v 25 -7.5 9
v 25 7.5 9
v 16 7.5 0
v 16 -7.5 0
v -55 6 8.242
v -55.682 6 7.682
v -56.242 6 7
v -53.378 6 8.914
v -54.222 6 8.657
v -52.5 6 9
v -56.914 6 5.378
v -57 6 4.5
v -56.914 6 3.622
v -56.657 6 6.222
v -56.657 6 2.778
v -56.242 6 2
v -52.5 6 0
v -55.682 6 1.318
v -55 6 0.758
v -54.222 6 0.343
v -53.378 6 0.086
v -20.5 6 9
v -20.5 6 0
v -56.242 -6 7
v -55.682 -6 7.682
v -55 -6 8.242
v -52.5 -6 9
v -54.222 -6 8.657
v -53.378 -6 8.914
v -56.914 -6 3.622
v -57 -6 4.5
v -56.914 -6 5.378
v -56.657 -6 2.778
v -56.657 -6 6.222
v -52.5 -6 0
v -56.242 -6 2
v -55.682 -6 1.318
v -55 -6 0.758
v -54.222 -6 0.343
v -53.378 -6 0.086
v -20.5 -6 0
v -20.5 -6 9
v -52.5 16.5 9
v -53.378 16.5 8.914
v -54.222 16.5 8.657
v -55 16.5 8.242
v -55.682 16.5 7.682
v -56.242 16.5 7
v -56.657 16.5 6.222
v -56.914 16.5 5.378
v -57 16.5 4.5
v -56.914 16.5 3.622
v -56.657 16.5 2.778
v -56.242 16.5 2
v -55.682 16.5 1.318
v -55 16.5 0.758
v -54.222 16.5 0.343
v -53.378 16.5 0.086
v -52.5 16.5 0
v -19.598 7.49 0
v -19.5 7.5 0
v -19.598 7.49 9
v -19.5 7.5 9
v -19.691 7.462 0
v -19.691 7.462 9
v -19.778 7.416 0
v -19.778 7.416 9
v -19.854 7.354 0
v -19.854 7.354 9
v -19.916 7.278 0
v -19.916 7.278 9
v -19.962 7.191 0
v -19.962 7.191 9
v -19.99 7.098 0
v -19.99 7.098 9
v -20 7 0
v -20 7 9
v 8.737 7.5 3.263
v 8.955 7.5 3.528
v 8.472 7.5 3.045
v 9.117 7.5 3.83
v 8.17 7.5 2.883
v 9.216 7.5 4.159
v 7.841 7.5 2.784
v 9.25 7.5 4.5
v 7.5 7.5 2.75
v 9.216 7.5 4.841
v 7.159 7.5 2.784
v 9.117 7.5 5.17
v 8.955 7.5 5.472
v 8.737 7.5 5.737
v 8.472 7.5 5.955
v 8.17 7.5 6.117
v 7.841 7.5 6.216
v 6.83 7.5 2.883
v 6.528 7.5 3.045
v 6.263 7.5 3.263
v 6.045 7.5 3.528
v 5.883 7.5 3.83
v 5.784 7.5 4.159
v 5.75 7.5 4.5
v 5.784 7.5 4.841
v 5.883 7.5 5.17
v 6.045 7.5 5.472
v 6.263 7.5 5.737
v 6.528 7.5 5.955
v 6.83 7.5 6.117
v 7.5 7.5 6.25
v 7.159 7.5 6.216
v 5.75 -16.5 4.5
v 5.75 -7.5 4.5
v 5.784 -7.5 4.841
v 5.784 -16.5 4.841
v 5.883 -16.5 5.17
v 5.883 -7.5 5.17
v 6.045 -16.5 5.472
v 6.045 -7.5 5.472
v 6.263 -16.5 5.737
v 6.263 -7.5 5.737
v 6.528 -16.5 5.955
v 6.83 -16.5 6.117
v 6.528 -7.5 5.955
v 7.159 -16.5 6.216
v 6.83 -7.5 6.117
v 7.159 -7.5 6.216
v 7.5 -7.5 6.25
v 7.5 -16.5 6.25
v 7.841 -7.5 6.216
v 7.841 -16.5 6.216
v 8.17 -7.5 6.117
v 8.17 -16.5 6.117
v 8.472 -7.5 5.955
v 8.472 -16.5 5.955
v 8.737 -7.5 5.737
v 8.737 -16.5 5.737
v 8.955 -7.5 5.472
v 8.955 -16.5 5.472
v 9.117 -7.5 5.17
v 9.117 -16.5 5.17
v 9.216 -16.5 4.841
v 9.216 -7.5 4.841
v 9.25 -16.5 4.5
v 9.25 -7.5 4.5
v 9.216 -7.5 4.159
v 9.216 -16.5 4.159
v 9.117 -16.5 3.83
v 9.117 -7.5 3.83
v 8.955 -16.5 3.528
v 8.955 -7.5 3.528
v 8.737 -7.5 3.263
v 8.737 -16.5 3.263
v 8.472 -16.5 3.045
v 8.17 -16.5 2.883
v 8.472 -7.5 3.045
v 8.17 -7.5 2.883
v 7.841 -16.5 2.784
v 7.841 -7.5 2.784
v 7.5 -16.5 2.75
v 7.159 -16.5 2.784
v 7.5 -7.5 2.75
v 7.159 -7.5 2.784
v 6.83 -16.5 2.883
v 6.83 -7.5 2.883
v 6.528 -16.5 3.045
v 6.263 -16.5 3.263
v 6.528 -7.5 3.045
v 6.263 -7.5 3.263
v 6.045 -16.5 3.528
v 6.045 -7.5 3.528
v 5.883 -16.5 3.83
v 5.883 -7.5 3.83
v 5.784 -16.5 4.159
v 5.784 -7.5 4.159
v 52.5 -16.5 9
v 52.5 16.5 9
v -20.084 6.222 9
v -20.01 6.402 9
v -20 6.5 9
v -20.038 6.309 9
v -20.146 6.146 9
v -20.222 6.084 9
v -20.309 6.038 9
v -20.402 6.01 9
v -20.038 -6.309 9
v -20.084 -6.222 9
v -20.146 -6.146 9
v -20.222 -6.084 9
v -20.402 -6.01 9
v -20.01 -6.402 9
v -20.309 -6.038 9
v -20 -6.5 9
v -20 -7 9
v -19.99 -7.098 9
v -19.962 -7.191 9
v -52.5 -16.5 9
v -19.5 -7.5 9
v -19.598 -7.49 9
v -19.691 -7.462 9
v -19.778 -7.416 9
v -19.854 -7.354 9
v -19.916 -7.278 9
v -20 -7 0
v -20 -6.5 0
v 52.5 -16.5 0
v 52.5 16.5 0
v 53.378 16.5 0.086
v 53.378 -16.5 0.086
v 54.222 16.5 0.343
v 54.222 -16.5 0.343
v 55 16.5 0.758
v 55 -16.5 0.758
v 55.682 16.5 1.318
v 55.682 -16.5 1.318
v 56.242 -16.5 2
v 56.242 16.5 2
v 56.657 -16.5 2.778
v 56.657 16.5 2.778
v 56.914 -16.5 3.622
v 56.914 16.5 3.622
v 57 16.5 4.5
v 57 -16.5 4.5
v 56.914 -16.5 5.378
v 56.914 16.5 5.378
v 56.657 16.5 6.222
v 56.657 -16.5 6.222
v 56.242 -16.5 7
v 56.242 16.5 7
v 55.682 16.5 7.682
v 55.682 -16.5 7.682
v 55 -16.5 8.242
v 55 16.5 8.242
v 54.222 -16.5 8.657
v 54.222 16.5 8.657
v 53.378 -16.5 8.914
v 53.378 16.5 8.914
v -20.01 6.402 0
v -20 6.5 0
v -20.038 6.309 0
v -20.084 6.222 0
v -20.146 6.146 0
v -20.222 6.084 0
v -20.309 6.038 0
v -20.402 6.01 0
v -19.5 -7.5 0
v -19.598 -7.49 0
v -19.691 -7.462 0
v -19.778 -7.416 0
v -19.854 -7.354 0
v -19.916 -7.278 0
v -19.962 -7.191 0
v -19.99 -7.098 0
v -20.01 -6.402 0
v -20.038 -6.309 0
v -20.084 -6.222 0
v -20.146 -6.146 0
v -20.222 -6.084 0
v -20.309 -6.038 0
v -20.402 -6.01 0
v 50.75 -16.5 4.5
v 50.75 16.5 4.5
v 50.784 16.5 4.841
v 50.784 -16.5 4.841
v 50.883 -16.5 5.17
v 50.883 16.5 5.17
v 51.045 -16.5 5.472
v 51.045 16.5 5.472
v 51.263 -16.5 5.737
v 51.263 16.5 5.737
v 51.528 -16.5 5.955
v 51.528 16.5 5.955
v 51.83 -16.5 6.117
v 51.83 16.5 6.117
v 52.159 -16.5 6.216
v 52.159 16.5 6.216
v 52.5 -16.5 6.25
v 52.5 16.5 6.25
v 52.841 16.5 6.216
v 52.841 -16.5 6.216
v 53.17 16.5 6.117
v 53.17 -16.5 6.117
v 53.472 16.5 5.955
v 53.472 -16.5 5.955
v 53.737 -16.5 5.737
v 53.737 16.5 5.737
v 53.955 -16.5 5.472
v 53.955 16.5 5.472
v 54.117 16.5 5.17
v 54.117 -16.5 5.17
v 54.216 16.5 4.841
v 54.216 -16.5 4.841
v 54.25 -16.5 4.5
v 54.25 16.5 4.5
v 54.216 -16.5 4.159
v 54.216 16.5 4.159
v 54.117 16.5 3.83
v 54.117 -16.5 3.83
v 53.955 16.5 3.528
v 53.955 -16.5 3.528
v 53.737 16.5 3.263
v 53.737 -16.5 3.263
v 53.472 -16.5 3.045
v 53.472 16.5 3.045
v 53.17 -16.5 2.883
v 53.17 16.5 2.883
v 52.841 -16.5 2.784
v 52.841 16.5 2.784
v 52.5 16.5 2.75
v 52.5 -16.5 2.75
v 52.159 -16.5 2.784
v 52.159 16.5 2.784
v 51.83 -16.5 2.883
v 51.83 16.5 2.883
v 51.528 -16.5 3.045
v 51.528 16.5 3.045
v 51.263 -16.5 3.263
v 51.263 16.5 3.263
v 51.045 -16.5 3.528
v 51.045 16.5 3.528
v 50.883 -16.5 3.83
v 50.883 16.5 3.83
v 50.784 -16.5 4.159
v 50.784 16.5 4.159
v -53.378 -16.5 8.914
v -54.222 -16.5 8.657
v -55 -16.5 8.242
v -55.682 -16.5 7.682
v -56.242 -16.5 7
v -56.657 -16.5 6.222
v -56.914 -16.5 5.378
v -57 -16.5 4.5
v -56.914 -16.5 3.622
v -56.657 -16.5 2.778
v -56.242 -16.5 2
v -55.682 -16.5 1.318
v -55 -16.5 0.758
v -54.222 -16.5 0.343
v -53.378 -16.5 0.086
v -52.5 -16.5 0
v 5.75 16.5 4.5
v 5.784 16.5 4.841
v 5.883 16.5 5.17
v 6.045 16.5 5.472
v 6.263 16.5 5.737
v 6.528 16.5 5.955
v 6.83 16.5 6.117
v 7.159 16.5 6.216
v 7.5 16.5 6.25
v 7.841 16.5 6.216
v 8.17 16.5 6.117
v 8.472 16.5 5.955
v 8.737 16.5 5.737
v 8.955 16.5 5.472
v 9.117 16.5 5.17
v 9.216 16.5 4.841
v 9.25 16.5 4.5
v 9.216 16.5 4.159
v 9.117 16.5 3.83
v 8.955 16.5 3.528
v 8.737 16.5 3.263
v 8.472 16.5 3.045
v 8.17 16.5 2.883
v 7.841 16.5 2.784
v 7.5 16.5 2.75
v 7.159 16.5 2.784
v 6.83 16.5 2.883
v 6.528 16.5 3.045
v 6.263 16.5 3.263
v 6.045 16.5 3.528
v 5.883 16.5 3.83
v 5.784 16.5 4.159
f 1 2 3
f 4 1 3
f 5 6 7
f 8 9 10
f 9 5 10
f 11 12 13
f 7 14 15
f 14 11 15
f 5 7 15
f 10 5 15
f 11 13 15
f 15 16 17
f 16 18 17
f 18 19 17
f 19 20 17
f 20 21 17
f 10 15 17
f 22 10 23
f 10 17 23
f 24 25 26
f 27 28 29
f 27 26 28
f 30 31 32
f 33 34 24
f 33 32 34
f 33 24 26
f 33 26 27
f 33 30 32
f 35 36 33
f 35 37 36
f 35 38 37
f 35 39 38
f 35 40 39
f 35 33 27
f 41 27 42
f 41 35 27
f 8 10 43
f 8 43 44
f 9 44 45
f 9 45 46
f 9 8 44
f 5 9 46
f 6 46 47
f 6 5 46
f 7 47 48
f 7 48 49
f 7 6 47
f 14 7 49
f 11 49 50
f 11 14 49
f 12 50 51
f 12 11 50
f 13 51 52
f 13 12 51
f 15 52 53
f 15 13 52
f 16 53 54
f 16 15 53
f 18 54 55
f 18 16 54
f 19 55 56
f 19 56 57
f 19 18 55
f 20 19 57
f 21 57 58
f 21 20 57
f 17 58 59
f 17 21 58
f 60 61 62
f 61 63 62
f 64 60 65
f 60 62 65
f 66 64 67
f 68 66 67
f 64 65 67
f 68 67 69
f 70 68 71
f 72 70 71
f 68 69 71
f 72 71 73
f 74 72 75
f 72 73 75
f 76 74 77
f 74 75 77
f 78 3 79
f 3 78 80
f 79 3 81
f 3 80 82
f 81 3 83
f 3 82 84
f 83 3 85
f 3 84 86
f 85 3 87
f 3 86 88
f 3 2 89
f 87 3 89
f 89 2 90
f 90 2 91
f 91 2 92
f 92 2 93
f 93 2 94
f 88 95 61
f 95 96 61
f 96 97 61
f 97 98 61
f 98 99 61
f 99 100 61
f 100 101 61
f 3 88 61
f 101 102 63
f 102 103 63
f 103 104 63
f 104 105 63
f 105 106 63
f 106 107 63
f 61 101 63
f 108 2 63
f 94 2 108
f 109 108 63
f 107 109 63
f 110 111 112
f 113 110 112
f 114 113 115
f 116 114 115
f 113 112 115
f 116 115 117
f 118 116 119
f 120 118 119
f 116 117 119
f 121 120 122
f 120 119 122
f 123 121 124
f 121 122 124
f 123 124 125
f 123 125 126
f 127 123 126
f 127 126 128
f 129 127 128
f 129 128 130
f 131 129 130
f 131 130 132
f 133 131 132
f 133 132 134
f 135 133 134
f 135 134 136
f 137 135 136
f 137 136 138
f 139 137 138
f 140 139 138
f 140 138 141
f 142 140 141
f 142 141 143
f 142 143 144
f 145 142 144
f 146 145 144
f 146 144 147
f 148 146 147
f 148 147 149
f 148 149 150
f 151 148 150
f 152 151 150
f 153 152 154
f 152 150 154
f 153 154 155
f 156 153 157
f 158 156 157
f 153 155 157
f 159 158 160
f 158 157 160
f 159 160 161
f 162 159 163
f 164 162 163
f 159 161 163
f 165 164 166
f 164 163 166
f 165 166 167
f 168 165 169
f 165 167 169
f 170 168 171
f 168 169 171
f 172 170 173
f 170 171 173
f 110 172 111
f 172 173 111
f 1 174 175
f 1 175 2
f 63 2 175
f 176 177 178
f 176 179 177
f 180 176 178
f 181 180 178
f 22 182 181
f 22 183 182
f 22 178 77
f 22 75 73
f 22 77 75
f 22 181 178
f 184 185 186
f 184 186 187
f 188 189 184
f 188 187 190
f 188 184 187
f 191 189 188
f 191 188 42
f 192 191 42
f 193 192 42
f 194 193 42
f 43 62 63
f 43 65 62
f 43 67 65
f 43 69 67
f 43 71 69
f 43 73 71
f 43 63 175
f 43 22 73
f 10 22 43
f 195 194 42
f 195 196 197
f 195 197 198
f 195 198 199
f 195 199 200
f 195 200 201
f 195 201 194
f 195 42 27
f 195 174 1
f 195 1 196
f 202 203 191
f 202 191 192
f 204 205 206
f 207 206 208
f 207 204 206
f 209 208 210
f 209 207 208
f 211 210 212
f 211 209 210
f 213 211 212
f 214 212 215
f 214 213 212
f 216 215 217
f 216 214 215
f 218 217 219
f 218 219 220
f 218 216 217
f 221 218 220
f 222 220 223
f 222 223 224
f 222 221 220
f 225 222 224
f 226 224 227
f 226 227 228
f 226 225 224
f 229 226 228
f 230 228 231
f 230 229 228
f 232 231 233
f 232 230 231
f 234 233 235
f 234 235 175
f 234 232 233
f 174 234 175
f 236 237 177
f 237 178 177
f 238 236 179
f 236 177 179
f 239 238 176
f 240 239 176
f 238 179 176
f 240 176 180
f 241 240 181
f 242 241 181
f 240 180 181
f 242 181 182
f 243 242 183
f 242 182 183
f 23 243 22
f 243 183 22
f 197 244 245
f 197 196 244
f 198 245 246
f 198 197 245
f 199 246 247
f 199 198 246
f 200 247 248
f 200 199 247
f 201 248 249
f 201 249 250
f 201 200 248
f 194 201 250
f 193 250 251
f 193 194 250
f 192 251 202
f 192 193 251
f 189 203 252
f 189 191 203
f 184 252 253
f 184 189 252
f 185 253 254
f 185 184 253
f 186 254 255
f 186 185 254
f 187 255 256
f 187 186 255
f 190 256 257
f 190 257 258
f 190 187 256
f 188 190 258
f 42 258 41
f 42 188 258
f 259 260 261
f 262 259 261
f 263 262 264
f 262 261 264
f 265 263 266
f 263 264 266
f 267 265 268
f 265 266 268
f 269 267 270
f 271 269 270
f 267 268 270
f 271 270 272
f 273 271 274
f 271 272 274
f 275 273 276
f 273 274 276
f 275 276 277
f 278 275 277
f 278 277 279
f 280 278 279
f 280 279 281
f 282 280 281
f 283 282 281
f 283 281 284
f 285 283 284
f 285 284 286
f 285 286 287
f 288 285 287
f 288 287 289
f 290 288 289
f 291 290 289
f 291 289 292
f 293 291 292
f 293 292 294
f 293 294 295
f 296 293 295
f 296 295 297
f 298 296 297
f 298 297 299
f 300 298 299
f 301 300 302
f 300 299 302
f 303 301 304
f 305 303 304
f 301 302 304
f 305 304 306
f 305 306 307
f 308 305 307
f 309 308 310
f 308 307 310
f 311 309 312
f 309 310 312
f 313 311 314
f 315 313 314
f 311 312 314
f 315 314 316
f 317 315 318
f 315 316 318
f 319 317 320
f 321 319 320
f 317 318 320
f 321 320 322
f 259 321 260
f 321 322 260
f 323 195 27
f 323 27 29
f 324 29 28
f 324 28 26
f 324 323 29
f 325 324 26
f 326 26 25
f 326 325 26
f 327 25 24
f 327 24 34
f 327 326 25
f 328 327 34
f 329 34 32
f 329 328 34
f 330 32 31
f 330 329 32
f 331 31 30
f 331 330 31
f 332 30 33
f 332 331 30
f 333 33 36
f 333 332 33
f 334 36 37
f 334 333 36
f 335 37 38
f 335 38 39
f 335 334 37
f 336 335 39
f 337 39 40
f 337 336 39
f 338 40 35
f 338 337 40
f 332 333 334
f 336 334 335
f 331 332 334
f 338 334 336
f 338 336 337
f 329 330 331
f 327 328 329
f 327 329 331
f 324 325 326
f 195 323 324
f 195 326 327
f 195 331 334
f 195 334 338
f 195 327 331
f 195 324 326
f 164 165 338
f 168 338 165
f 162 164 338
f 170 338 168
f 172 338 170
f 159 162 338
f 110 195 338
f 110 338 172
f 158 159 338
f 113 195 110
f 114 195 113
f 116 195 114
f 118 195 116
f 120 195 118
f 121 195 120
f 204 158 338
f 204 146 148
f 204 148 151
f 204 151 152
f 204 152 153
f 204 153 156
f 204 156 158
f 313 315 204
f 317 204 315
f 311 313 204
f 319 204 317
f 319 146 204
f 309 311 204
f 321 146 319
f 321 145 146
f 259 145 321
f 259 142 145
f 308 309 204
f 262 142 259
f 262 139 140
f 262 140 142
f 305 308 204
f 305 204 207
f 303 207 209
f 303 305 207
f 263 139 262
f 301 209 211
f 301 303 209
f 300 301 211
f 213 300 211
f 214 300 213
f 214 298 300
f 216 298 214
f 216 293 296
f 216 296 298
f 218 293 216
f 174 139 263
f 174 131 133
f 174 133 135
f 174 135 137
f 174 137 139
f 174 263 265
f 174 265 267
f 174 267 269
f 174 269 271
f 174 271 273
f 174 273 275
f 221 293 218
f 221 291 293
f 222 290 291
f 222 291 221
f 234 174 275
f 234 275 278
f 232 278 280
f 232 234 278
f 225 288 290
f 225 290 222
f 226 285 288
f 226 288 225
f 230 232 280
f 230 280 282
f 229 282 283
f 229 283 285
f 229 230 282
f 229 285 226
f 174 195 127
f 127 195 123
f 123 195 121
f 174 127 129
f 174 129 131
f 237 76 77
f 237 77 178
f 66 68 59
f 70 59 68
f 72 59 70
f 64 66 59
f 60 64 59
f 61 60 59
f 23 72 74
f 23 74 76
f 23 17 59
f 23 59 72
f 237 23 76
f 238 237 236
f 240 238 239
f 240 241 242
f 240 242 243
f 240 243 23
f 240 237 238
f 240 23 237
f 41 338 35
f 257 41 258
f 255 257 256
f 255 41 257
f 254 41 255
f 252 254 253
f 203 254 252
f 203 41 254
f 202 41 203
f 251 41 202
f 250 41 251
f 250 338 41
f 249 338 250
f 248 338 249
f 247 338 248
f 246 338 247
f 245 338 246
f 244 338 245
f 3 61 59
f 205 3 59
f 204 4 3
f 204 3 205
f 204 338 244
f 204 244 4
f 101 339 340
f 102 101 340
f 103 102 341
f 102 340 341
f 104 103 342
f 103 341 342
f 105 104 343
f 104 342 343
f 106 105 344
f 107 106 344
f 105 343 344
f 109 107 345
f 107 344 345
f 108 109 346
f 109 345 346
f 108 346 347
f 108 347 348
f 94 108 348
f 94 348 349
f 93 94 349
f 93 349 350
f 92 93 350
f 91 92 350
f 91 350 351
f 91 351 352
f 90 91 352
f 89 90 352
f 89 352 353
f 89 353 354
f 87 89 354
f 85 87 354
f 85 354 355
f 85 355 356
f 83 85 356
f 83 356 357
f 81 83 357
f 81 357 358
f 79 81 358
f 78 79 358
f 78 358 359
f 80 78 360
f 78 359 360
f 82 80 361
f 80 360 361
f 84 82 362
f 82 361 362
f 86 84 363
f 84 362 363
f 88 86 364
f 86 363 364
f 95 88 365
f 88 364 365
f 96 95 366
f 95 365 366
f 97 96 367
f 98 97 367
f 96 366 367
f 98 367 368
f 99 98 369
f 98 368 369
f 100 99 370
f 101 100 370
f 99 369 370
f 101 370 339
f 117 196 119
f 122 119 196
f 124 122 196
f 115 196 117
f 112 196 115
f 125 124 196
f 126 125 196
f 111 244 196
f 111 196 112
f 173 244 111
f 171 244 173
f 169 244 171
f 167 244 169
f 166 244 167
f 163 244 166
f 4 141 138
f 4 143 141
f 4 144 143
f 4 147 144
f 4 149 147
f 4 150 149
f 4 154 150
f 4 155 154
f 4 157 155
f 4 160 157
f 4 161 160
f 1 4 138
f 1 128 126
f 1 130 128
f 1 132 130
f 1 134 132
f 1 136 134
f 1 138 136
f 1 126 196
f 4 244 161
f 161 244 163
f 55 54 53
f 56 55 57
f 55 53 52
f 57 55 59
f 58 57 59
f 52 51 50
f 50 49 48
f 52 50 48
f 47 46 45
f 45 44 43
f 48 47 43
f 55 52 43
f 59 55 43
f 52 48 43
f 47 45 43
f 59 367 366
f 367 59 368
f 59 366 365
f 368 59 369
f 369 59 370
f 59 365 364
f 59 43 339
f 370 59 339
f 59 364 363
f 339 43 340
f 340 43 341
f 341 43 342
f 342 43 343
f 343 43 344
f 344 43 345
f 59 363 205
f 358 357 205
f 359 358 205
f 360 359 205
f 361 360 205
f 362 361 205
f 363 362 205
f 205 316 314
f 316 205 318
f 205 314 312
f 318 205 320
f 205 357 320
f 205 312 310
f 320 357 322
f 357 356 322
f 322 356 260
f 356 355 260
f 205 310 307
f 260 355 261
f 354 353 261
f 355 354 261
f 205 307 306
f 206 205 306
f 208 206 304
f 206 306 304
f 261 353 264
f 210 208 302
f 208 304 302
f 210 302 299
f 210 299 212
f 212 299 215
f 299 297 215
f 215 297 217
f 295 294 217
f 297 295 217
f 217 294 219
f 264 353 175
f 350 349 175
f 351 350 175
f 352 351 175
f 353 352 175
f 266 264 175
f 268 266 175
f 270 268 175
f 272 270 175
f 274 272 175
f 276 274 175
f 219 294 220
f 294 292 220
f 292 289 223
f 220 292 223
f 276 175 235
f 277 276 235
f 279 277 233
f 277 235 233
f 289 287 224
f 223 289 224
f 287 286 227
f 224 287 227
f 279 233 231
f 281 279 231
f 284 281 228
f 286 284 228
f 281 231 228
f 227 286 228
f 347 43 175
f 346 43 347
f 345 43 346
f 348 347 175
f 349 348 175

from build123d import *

# Parameters (mm, degrees)
F1_DEPTH    = 16.5
F3_D        = 3.5
F4_W        = 40
F4_H        = 12
F5_DEPTH    = 25
F7_T1_DEPTH = 15
F8_R        = 0.5


# Not quite as in the source:
# - a fillet or chamfer that OpenCascade refuses, or shapes differently, is made with other operations: its cross-section is extruded or revolved along the edge and cut away or added


with BuildPart() as f1:
    # F0 (on Front) → F1 (new body, symmetric)
    with BuildSketch(Plane.XZ):
        with BuildLine():
            ThreePointArc((-52.5, 9), (-57, 4.5), (-52.5, 0))
            Line((-52.5, 0), (52.5, 0))
            ThreePointArc((52.5, 0), (57, 4.5), (52.5, 9))
            Line((52.5, 9), (-52.5, 9))
        make_face()
    extrude(amount=F1_DEPTH, both=True)

    # F3 (through all)
    with Locations(Plane.XZ.offset(16.5)):
        with Locations((7.5, 4.5), (52.5, 4.5)):
            Hole(F3_D / 2)


with BuildPart() as f5:
    # F4 (on Top) → F5 (new body)
    with BuildSketch(Plane.XY):
        Polygon((15, 7.5), (-20, 7.5), (-20, 6), (-20, -6), (-20, -7.5), (15, -7.5), align=None)
        with Locations((-40, 0)):
            Rectangle(F4_W, F4_H)
    extrude(amount=F5_DEPTH)


with BuildPart() as f1_1:
    add(f1.part)

    # F6: cut F5
    add(f5.part, mode=Mode.SUBTRACT)

    # F7: chamfer of 10 on 1 edges, made by hand

    # F7_s2 → F7_t1 (cut)
    with BuildSketch(Plane.XZ.offset(-7.5)):
        with BuildLine():
            Line((25.2828427125, 9.2828427125), (14.7171572875, -1.2828427125))
            Line((14.7171572875, -1.2828427125), (14.5171572875, -1.2828427125))
            ThreePointArc((14.5171572875, -1.2828427125), (14.8, 3.8585786438), (14.8, 9))
            Line((14.8, 9), (15, 9.2))
            ThreePointArc((15, 9.2), (20.1414213562, 9.2), (25.2828427125, 9.4828427125))
            Line((25.2828427125, 9.4828427125), (25.2828427125, 9.2828427125))
        make_face()
    extrude(amount=F7_T1_DEPTH, mode=Mode.SUBTRACT)

    # F8
    f8_edges = [f1_1.edges().sort_by_distance(p)[0] for p in [
        (-20, 7.5, 4.5),
        (-20, 6, 4.5),
        (-20, -7.5, 4.5),
        (-20, -6, 4.5),
    ]]
    fillet(f8_edges, radius=F8_R)


solid = f1_1.part
